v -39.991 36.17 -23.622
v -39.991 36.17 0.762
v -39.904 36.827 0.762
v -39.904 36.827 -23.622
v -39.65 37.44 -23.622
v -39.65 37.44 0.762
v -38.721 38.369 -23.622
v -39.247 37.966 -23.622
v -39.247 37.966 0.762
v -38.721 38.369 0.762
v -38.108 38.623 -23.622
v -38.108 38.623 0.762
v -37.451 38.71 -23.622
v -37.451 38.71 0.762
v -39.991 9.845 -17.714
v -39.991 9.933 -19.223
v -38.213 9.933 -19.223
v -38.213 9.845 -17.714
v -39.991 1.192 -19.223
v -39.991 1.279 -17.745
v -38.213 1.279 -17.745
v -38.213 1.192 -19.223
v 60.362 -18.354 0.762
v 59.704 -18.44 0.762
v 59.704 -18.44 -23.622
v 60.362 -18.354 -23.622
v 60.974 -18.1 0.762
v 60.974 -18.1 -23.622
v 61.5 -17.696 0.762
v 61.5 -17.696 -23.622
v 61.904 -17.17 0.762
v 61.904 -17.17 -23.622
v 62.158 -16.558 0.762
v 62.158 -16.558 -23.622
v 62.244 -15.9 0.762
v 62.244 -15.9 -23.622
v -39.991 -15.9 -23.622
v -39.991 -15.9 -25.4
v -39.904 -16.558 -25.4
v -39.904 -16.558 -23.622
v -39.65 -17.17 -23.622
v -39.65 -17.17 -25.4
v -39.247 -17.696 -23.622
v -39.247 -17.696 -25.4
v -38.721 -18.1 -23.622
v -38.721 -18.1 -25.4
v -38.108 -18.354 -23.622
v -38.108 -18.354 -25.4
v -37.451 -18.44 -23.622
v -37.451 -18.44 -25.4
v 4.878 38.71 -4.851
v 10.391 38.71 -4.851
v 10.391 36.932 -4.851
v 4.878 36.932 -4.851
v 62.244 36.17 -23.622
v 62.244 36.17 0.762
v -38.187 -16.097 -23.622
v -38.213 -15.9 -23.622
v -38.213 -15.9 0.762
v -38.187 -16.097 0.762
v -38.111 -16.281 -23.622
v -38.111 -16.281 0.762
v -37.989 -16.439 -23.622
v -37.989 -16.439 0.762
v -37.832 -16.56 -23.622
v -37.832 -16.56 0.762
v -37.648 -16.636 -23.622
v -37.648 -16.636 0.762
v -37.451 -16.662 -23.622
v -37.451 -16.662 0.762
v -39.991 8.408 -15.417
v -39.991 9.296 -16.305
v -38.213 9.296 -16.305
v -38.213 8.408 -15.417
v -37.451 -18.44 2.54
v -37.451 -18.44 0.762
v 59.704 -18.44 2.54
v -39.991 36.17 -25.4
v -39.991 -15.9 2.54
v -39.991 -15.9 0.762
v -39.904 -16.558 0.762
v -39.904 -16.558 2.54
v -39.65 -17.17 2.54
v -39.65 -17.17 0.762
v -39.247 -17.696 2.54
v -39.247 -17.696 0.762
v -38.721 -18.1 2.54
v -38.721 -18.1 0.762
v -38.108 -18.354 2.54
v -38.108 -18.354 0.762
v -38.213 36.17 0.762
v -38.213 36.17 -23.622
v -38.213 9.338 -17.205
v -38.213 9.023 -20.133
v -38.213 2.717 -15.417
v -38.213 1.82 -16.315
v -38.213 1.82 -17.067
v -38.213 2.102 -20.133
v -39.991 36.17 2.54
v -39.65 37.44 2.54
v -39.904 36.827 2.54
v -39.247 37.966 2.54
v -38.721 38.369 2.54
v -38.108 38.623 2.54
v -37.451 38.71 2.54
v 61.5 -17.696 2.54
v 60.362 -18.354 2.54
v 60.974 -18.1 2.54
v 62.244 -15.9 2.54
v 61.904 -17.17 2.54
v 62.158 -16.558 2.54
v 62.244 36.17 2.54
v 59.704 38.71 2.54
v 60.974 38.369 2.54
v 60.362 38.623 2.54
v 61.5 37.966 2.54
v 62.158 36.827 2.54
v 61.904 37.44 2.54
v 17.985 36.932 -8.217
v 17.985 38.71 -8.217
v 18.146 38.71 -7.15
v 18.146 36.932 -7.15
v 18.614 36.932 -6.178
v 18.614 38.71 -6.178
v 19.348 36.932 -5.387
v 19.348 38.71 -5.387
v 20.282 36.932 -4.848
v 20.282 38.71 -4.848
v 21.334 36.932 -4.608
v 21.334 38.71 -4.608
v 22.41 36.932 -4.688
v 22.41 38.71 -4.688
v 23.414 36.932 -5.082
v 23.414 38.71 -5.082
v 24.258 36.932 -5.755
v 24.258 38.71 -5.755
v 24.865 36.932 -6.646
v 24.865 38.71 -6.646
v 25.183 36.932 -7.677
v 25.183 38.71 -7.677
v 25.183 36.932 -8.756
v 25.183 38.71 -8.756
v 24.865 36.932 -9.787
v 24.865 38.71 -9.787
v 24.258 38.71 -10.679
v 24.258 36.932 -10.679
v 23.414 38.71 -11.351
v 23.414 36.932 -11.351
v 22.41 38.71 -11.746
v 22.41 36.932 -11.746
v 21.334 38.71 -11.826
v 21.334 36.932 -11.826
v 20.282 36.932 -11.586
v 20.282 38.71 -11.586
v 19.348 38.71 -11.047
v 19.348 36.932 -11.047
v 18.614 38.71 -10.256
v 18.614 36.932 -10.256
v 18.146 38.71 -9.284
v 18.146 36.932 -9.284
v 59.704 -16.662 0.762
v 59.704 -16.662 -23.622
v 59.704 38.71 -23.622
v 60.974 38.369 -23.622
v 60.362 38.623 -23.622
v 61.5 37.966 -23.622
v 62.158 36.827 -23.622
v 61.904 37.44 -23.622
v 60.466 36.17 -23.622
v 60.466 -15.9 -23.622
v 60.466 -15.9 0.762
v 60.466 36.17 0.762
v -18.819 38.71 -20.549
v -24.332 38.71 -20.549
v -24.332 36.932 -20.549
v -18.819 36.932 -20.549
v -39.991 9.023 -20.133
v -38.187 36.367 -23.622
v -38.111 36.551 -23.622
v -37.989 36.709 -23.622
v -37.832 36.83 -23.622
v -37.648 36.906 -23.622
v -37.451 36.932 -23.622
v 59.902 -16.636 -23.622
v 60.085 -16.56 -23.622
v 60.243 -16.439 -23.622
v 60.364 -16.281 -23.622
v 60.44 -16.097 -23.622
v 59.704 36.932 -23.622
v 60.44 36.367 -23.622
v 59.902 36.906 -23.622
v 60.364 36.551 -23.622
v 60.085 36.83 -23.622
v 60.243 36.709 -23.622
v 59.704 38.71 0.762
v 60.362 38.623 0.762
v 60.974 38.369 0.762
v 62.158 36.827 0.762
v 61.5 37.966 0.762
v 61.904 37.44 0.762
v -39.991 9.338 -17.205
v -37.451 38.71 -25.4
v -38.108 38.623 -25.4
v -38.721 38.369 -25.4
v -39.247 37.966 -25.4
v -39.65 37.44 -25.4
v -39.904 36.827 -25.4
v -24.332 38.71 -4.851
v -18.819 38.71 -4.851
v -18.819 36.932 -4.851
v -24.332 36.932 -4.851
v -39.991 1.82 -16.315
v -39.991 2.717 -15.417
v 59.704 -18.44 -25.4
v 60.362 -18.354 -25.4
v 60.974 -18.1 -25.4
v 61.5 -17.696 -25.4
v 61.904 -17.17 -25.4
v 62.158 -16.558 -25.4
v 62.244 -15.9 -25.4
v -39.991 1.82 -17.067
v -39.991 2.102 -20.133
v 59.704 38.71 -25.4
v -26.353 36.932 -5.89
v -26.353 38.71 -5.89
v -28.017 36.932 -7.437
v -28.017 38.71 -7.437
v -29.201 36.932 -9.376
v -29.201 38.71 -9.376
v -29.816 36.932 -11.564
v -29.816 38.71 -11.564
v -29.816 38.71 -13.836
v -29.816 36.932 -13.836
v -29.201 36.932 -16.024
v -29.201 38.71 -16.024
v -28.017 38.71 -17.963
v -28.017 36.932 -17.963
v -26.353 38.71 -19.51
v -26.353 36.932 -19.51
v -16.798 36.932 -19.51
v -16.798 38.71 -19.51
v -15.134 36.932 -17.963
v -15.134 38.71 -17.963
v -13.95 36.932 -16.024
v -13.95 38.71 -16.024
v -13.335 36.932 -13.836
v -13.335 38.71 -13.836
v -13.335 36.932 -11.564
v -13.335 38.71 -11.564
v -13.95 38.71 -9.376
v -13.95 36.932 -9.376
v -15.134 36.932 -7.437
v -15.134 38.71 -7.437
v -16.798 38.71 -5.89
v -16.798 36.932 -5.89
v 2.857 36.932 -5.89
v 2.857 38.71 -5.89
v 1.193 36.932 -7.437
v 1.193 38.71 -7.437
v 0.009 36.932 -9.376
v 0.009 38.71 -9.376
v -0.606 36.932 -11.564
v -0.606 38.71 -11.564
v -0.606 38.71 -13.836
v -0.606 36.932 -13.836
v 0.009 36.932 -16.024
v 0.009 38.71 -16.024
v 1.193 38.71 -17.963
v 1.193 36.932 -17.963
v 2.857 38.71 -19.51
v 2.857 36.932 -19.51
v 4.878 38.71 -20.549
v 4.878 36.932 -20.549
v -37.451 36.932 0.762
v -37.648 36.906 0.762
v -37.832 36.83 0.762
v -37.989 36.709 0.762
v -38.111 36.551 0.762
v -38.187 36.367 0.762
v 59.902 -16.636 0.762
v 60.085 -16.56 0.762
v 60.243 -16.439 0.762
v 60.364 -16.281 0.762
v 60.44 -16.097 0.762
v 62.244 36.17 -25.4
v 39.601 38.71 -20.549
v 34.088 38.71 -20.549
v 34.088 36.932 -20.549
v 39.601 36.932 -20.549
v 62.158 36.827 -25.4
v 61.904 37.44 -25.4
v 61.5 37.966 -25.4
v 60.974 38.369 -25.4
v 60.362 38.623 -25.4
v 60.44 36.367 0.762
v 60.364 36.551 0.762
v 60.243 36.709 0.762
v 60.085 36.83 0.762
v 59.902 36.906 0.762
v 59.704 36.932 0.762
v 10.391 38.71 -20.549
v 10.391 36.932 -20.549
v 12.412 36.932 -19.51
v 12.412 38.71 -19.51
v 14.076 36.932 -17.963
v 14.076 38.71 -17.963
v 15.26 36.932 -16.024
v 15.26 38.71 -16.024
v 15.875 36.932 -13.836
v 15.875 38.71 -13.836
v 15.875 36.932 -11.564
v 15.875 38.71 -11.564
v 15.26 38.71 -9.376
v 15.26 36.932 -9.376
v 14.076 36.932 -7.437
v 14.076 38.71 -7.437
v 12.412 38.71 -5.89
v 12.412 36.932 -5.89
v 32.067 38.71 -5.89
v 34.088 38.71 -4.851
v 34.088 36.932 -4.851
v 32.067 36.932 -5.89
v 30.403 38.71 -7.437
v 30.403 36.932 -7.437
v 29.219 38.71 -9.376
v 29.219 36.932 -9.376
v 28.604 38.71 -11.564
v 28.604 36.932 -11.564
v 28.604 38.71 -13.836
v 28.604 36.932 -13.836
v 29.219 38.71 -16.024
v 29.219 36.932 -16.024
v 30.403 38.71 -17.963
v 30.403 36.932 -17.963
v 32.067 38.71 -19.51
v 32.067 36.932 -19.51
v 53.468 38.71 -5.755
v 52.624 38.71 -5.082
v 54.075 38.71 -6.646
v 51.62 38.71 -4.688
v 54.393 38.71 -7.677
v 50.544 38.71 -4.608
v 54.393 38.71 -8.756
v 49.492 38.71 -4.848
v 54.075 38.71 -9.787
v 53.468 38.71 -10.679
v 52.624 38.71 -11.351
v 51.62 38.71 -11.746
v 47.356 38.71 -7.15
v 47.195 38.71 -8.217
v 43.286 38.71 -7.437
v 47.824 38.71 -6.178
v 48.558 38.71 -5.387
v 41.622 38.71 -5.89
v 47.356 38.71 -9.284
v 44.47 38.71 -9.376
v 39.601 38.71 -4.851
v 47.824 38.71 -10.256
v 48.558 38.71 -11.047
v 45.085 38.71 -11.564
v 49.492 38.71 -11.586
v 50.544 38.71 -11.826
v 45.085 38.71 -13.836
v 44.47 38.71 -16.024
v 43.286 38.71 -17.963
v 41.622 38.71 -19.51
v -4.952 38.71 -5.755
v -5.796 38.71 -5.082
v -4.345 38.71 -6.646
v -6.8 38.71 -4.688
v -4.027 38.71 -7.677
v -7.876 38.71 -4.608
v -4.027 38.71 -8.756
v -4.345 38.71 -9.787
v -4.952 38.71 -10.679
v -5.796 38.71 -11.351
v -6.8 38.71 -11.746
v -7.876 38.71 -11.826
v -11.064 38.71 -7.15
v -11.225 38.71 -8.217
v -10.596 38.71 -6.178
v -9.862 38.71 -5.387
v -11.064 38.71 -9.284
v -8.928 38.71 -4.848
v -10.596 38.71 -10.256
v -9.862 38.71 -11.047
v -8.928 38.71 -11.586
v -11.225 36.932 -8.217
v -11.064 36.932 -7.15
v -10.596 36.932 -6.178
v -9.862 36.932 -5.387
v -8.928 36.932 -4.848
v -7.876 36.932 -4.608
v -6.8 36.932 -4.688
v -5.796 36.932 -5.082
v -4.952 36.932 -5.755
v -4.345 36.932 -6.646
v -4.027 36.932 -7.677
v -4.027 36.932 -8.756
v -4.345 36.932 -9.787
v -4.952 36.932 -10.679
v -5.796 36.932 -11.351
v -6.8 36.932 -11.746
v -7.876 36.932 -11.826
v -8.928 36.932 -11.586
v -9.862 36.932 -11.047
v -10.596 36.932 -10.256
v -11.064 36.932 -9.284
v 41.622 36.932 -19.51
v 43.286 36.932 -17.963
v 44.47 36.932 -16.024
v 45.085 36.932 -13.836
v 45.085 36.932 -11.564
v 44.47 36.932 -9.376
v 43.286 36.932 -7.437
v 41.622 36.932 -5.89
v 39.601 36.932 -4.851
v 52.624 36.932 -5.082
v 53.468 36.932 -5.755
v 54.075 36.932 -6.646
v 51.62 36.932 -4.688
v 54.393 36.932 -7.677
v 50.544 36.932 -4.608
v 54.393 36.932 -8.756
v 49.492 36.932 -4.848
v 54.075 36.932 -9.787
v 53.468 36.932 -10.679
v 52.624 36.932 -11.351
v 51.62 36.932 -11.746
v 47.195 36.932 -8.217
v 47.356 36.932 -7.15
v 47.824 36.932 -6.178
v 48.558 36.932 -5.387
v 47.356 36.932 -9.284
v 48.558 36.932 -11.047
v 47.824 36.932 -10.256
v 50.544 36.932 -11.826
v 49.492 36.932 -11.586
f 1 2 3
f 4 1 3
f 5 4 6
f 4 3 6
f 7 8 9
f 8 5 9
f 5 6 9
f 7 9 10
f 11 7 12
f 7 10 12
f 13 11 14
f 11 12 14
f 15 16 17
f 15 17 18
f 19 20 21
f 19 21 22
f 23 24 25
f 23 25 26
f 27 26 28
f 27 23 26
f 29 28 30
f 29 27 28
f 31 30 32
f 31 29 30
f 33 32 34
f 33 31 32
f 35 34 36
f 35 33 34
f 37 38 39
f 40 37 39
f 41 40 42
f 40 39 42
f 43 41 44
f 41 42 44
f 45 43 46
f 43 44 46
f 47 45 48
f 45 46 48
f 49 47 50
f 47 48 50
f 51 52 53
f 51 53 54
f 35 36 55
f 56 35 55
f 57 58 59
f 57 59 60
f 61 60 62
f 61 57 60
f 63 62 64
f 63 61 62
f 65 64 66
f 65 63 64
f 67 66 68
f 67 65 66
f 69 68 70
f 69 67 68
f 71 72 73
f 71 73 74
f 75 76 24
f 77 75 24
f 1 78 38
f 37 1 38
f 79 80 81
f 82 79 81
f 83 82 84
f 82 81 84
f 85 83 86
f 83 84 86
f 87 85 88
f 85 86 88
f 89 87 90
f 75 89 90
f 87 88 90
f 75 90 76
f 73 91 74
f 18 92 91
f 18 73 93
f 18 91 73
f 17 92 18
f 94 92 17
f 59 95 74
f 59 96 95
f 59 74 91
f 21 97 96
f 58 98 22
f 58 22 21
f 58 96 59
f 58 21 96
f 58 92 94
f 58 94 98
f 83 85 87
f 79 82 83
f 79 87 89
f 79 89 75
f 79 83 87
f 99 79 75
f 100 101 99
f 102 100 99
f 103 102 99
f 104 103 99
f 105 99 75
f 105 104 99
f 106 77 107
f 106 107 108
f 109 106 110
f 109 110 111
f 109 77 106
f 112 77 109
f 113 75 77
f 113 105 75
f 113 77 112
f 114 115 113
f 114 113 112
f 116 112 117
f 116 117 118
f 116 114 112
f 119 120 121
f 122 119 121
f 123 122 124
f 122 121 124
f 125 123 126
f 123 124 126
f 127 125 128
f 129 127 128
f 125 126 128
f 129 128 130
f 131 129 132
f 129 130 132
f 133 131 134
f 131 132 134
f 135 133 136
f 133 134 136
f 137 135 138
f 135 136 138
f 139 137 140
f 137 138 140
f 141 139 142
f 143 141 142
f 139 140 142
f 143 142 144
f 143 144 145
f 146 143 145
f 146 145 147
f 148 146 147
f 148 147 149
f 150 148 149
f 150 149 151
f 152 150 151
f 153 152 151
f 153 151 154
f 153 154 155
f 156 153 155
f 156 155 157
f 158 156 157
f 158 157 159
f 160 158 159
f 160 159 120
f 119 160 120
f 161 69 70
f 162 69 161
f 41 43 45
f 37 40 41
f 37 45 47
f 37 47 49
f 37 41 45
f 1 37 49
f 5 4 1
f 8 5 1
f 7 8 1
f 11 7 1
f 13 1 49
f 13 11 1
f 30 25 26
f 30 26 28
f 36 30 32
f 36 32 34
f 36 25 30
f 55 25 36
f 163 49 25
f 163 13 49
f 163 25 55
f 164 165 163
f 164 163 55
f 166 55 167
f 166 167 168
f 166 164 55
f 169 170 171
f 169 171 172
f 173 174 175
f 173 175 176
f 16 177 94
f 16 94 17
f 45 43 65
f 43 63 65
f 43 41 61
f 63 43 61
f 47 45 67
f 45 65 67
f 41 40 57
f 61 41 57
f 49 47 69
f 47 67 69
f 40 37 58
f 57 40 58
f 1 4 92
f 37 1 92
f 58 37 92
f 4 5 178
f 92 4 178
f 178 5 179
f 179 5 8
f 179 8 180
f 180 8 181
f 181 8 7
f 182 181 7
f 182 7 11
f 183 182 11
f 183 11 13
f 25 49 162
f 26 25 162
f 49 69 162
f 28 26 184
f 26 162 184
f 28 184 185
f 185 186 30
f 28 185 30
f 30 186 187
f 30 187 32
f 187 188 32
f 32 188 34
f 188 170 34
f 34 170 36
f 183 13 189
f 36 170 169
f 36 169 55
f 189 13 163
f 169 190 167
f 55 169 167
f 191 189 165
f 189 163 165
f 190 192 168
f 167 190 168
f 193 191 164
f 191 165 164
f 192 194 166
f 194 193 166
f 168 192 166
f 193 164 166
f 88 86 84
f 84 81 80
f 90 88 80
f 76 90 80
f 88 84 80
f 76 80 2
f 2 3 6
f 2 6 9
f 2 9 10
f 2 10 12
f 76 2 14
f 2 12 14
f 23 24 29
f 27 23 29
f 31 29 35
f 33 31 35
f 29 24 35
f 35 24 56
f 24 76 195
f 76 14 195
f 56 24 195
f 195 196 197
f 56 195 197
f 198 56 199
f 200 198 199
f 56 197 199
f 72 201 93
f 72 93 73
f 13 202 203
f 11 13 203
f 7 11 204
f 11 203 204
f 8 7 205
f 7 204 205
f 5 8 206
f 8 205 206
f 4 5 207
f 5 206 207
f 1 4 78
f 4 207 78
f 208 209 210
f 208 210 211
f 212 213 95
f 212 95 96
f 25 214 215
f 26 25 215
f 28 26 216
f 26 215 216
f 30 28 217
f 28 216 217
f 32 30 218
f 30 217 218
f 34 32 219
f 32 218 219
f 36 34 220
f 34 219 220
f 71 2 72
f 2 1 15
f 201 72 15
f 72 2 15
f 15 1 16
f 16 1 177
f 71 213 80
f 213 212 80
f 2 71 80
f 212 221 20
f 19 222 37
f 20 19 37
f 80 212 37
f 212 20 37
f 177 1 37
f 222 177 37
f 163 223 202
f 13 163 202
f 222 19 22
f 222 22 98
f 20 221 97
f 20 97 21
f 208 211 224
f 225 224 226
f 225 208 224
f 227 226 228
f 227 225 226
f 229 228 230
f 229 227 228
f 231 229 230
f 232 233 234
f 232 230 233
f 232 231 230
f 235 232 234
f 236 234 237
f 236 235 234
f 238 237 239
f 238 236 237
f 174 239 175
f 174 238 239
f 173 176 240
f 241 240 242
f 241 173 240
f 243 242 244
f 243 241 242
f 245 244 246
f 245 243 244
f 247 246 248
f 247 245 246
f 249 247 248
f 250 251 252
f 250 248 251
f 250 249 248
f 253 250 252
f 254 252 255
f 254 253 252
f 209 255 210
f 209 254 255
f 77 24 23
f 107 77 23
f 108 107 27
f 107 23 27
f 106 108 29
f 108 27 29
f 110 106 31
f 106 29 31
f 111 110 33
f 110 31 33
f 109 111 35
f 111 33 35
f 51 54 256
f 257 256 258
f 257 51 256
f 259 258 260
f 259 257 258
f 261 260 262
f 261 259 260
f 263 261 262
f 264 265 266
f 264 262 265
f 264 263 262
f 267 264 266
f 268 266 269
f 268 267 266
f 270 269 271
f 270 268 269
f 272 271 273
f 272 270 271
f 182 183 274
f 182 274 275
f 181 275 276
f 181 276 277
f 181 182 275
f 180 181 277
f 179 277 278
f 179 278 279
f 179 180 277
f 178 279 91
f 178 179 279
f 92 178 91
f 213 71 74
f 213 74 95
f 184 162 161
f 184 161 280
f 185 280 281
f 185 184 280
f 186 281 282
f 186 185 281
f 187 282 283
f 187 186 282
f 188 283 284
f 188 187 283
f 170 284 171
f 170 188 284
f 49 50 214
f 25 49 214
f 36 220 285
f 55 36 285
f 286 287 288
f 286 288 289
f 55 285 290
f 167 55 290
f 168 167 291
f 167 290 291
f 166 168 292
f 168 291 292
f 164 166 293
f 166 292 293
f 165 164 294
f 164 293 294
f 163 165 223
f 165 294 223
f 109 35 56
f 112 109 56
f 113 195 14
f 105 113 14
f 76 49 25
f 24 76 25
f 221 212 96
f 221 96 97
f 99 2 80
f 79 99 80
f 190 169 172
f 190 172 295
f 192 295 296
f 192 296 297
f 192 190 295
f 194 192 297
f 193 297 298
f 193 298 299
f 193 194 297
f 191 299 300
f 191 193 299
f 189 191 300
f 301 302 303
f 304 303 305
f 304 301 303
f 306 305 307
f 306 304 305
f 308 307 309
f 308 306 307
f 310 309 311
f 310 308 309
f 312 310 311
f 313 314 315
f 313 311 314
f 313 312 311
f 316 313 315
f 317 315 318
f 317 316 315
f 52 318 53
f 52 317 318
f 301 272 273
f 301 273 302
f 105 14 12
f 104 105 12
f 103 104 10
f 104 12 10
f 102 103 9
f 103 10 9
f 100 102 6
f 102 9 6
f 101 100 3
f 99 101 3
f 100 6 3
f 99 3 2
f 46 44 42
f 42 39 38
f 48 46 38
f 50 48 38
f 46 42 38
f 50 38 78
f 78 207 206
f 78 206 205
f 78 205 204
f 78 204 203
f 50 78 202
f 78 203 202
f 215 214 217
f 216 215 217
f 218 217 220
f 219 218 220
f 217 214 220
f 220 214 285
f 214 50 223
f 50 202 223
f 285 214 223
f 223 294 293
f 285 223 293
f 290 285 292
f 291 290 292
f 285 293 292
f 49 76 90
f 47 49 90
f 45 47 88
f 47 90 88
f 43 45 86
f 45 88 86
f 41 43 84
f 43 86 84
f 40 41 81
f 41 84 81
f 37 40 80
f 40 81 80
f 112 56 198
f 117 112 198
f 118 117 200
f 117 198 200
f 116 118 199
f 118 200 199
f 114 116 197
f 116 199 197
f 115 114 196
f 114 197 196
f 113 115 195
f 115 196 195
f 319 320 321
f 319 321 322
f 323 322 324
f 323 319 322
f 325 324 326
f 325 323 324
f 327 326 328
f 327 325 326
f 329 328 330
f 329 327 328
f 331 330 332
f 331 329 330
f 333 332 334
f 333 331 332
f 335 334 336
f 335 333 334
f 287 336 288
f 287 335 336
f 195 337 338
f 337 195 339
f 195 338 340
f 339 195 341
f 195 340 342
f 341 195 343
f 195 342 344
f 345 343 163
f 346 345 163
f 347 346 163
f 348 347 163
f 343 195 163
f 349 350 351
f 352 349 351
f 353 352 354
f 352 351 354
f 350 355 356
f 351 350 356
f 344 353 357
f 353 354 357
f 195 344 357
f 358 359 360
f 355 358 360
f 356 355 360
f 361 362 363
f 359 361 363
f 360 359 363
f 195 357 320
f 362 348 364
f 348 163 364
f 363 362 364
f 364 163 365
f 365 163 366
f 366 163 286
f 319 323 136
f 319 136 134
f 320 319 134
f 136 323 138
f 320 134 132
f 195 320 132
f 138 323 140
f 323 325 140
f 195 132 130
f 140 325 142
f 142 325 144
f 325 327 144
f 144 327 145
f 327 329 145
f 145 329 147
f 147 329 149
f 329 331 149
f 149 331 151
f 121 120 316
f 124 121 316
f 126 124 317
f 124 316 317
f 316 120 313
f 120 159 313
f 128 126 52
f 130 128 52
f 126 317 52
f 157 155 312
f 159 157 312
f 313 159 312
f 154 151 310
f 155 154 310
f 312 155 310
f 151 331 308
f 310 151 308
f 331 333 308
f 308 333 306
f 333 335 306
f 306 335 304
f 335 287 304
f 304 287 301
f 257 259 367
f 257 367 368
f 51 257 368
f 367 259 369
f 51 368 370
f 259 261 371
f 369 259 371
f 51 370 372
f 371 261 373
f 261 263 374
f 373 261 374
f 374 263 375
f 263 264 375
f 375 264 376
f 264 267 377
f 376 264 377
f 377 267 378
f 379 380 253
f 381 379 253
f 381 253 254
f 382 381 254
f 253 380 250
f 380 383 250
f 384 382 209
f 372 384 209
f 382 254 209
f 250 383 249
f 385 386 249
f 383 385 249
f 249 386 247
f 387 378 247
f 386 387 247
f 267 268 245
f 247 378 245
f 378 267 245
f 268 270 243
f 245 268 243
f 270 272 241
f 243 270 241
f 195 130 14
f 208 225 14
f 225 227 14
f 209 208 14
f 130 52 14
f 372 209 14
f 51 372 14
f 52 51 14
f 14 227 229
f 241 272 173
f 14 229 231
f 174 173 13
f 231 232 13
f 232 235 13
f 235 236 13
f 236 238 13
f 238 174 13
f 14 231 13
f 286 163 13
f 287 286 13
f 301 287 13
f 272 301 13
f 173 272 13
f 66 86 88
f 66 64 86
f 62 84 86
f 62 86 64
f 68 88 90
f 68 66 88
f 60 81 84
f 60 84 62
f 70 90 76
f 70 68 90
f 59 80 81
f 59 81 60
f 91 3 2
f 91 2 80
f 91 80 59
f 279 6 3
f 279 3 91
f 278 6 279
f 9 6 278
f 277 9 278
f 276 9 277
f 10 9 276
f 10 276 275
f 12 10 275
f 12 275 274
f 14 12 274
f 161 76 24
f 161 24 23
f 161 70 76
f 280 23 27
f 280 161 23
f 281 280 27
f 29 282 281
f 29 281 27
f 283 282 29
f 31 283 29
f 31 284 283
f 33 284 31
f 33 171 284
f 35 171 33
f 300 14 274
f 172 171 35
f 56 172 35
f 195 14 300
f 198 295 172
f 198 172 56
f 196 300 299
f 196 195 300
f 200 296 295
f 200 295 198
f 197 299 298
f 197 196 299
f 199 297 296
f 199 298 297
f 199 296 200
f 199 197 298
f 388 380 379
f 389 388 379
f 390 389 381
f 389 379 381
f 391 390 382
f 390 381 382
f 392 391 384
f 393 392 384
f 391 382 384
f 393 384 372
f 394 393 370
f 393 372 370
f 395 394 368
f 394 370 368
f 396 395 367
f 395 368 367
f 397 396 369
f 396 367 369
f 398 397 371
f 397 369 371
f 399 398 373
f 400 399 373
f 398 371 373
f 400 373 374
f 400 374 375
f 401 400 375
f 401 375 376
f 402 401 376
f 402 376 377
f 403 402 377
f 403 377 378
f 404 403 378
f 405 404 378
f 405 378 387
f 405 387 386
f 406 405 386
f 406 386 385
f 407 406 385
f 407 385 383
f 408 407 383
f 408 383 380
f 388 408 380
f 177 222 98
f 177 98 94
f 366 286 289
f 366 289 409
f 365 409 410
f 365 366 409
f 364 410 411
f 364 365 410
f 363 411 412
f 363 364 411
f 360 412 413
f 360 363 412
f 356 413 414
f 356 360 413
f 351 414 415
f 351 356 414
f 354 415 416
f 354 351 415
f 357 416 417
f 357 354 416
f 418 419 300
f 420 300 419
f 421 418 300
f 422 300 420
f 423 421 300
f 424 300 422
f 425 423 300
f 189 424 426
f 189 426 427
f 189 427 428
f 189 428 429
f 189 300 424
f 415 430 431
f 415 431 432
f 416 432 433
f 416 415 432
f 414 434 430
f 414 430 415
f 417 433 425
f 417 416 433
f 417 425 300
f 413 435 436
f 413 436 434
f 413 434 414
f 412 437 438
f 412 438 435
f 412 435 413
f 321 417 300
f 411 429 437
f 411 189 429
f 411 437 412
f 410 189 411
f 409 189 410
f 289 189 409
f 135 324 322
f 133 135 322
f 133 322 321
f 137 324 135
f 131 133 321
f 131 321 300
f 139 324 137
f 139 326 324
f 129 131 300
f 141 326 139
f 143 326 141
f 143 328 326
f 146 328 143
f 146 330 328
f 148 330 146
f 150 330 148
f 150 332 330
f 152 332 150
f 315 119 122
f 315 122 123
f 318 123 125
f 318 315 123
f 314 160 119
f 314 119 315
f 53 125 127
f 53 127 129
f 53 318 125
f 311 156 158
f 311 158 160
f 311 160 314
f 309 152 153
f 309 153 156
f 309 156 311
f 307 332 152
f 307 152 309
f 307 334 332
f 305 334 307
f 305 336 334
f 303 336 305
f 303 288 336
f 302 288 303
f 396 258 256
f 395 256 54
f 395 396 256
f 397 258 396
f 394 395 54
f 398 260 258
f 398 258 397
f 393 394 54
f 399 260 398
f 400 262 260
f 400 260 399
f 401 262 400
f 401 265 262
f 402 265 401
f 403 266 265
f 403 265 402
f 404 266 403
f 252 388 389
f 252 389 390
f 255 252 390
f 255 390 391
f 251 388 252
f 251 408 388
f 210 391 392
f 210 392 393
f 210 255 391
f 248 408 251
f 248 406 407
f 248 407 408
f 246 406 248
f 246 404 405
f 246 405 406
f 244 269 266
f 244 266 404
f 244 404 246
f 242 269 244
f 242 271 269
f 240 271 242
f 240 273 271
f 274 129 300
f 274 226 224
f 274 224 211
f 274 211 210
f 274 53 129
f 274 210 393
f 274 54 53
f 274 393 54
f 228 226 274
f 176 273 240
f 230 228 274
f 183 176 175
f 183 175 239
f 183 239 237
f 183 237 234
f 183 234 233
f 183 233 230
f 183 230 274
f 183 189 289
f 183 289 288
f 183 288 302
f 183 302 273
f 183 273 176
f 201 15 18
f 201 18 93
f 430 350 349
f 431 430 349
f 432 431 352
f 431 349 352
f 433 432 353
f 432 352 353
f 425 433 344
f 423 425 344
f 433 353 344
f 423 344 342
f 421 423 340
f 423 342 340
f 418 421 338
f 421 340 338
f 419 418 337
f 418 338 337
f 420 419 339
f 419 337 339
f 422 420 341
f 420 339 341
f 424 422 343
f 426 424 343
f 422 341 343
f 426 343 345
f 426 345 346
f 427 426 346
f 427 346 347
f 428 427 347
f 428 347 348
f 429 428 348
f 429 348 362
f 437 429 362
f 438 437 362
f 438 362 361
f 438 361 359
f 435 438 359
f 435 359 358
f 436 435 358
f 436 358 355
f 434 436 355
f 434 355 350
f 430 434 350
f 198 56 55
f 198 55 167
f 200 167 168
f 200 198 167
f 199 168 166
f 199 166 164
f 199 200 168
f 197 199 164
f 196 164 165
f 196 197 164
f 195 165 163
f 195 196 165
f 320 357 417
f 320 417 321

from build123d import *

# Parameters (mm, degrees)
BOSS_EXTRUDE1_DEPTH      = 2.54
BOSS_EXTRUDE1_DEPTH_BACK = 25.4
CUT_EXTRUDE1_DEPTH       = 2.54
SKETCH4_R                = 3.6195
CUT_EXTRUDE3_DEPTH       = 2.54
FILLET1_R                = 2.54
SKETCH3_W                = 11.508
SKETCH3_H                = 9.508
CUT_EXTRUDE2_DEPTH       = 1.27
SKETCH7_W                = 14.782
SKETCH7_H                = 12.682999998
BOSS_EXTRUDE2_DEPTH      = 2.54
SHELL1_START             = -23.622
SHELL1_DEPTH             = 24.384
SPLIT1_START             = -25.4
SPLIT1_DEPTH             = 1.778
SPLIT1_2_DEPTH           = 1.778
SPLIT1_START_2           = 0.762
SPLIT1_3_DEPTH           = 1.778
SPLIT1_4_DEPTH           = 1.778


# Read off the part's stored shape, not the designer's step: Shell1, Split1
with BuildPart() as part:
    # Sketch1 → Boss-Extrude1 (new, two sides: drawn at the far end of the back side and taken through both)
    with BuildSketch(Plane.XY.offset(-BOSS_EXTRUDE1_DEPTH_BACK)):
        Polygon((-39.990606027, -18.440246583), (62.244393973, -18.440246583), (62.244393973, -15.392246583), (62.244393973, 26.517753417), (62.244393973, 38.709753417), (-39.990606027, 38.709753417), (-39.990606027, 26.517753417), (-39.990606027, -15.392246583), align=None)
    extrude(amount=BOSS_EXTRUDE1_DEPTH + BOSS_EXTRUDE1_DEPTH_BACK)

    # Sketch2 → Cut-Extrude1 (cut)
    with BuildSketch(Plane.ZY.offset(39.990606027)):
        Polygon((-20.133, 2.102332927), (-20.133, 9.023173906), (-19.222946487, 9.93322742), (-17.713785822, 9.844771641), (-17.205002954, 9.338498651), (-16.304724783, 9.29589869), (-15.417, 8.408173907), (-15.417, 2.717332928), (-16.31457951, 1.819753417), (-17.067151023, 1.819753417), (-17.744895832, 1.278911755), (-19.222946485, 1.192279414), align=None)
    extrude(amount=-CUT_EXTRUDE1_DEPTH, mode=Mode.SUBTRACT)

    # Sketch4 → Cut-Extrude3 (cut)
    with BuildSketch(Plane(origin=(0, 38.709753417, 0), x_dir=(1, 0, 0), z_dir=(0, 1, 0))):
        with Locations(Location((-7.605606027, 8.2169, 0), (0, 0, 180))):
            Circle(SKETCH4_R)
        with Locations(Location((21.604393973, 8.2169, 0), (0, 0, 180))):
            Circle(SKETCH4_R)
        with Locations(Location((50.814393973, 8.2169, 0), (0, 0, 180))):
            Circle(SKETCH4_R)
        with BuildLine():
            Line((-24.331857157, 20.5486), (-18.819354898, 20.5486))
            ThreePointArc((-18.819354898, 20.5486), (-13.257106027, 12.7), (-18.819354898, 4.8514))
            Line((-18.819354898, 4.8514), (-24.331857157, 4.8514))
            ThreePointArc((-24.331857157, 4.8514), (-29.894106027, 12.7), (-24.331857157, 20.5486))
        make_face()
        with BuildLine():
            Line((10.390645102, 4.8514), (4.878142843, 4.8514))
            ThreePointArc((4.878142843, 4.8514), (-0.684106027, 12.7), (4.878142843, 20.5486))
            Line((4.878142843, 20.5486), (10.390645102, 20.5486))
            ThreePointArc((10.390645102, 20.5486), (15.952893973, 12.7), (10.390645102, 4.8514))
        make_face()
        with BuildLine():
            Line((39.600645102, 4.8514), (34.088142843, 4.8514))
            ThreePointArc((34.088142843, 4.8514), (28.525893973, 12.7), (34.088142843, 20.5486))
            Line((34.088142843, 20.5486), (39.600645102, 20.5486))
            ThreePointArc((39.600645102, 20.5486), (45.162893973, 12.7), (39.600645102, 4.8514))
        make_face()
    extrude(amount=-CUT_EXTRUDE3_DEPTH, mode=Mode.SUBTRACT)

    # Fillet1
    fillet1_edges = [part.edges().sort_by_distance(p)[0] for p in [
        (-39.990606027, 38.709753417, -11.43),
        (62.244393973, 38.709753417, -11.43),
        (62.244393973, -18.440246583, -11.43),
        (-39.990606027, -18.440246583, -11.43),
    ]]
    fillet(fillet1_edges, radius=FILLET1_R)

    # Sketch3 → Cut-Extrude2 (cut)
    with BuildSketch(Plane.ZY.offset(39.990606027)):
        with Locations((-8.929, 4.610253417)):
            Rectangle(SKETCH3_W, SKETCH3_H)
    extrude(amount=-CUT_EXTRUDE2_DEPTH, mode=Mode.SUBTRACT)

    # Sketch7 → Boss-Extrude2 (add)
    with BuildSketch(Plane.ZY.offset(39.990606027)):
        with Locations((-8.026, 5.562753418)):
            Rectangle(SKETCH7_W, SKETCH7_H)
    extrude(amount=-BOSS_EXTRUDE2_DEPTH)

    # Shell1 outline → Shell1 (cut)
    with BuildSketch(Plane.XY.offset(SHELL1_START)):
        with BuildLine():
            Line((-38.212606027, 1.819753417), (-38.212606027, -15.900246583))
            ThreePointArc((-38.212606027, -15.900246583), (-37.989421394, -16.43906195), (-37.450606027, -16.662246583))
            Line((-37.450606027, -16.662246583), (59.704393973, -16.662246583))
            ThreePointArc((59.704393973, -16.662246583), (60.24320934, -16.43906195), (60.466393973, -15.900246583))
            Line((60.466393973, -15.900246583), (60.466393973, 36.169753417))
            ThreePointArc((60.466393973, 36.169753417), (60.24320934, 36.708568784), (59.704393973, 36.931753417))
            Line((59.704393973, 36.931753417), (-37.450606027, 36.931753417))
            ThreePointArc((-37.450606027, 36.931753417), (-37.989421394, 36.708568784), (-38.212606027, 36.169753417))
            Line((-38.212606027, 36.169753417), (-38.212606027, 1.819753417))
        make_face()
    extrude(amount=SHELL1_DEPTH, mode=Mode.SUBTRACT)

    # Split1 2 outline → Split1 2 (cut)
    with BuildSketch(Plane.XY.offset(SPLIT1_START)):
        with BuildLine():
            Line((-37.450606027, -18.440246583), (59.704393973, -18.440246583))
            ThreePointArc((59.704393973, -18.440246583), (61.500445197, -17.696297807), (62.244393973, -15.900246583))
            Line((62.244393973, -15.900246583), (62.244393973, 36.169753417))
            ThreePointArc((62.244393973, 36.169753417), (61.500445197, 37.965804641), (59.704393973, 38.709753417))
            Line((59.704393973, 38.709753417), (-37.450606027, 38.709753417))
            ThreePointArc((-37.450606027, 38.709753417), (-39.246657251, 37.965804641), (-39.990606027, 36.169753417))
            Line((-39.990606027, 36.169753417), (-39.990606027, -15.900246583))
            ThreePointArc((-39.990606027, -15.900246583), (-39.246657251, -17.696297807), (-37.450606027, -18.440246583))
        make_face()
    extrude(amount=SPLIT1_2_DEPTH, mode=Mode.SUBTRACT)

    # Split1 3 outline → Split1 3 (cut)
    with BuildSketch(Plane.XY.offset(SPLIT1_START_2)):
        with BuildLine():
            Line((-37.450606027, -18.440246583), (59.704393973, -18.440246583))
            ThreePointArc((59.704393973, -18.440246583), (61.500445197, -17.696297807), (62.244393973, -15.900246583))
            Line((62.244393973, -15.900246583), (62.244393973, 36.169753417))
            ThreePointArc((62.244393973, 36.169753417), (61.500445197, 37.965804641), (59.704393973, 38.709753417))
            Line((59.704393973, 38.709753417), (-37.450606027, 38.709753417))
            ThreePointArc((-37.450606027, 38.709753417), (-39.246657251, 37.965804641), (-39.990606027, 36.169753417))
            Line((-39.990606027, 36.169753417), (-39.990606027, -15.900246583))
            ThreePointArc((-39.990606027, -15.900246583), (-39.246657251, -17.696297807), (-37.450606027, -18.440246583))
        make_face()
    extrude(amount=SPLIT1_3_DEPTH, mode=Mode.SUBTRACT)


with BuildPart() as body_2:
    # Split1 outline → Split1 (new body)
    with BuildSketch(Plane.XY.offset(SPLIT1_START)):
        with BuildLine():
            Line((-39.990606027, 36.169753417), (-39.990606027, -15.900246583))
            ThreePointArc((-39.990606027, -15.900246583), (-39.246657251, -17.696297807), (-37.450606027, -18.440246583))
            Line((-37.450606027, -18.440246583), (59.704393973, -18.440246583))
            ThreePointArc((59.704393973, -18.440246583), (61.500445197, -17.696297807), (62.244393973, -15.900246583))
            Line((62.244393973, -15.900246583), (62.244393973, 36.169753417))
            ThreePointArc((62.244393973, 36.169753417), (61.500445197, 37.965804641), (59.704393973, 38.709753417))
            Line((59.704393973, 38.709753417), (-37.450606027, 38.709753417))
            ThreePointArc((-37.450606027, 38.709753417), (-39.246657251, 37.965804641), (-39.990606027, 36.169753417))
        make_face()
    extrude(amount=SPLIT1_DEPTH)


with BuildPart() as body_3:
    # Split1 4 outline → Split1 4 (new body)
    with BuildSketch(Plane.XY.offset(SPLIT1_START_2)):
        with BuildLine():
            Line((-39.990606027, 36.169753417), (-39.990606027, -15.900246583))
            ThreePointArc((-39.990606027, -15.900246583), (-39.246657251, -17.696297807), (-37.450606027, -18.440246583))
            Line((-37.450606027, -18.440246583), (59.704393973, -18.440246583))
            ThreePointArc((59.704393973, -18.440246583), (61.500445197, -17.696297807), (62.244393973, -15.900246583))
            Line((62.244393973, -15.900246583), (62.244393973, 36.169753417))
            ThreePointArc((62.244393973, 36.169753417), (61.500445197, 37.965804641), (59.704393973, 38.709753417))
            Line((59.704393973, 38.709753417), (-37.450606027, 38.709753417))
            ThreePointArc((-37.450606027, 38.709753417), (-39.246657251, 37.965804641), (-39.990606027, 36.169753417))
        make_face()
    extrude(amount=SPLIT1_4_DEPTH)


solid = Compound([part.part, body_2.part, body_3.part])
